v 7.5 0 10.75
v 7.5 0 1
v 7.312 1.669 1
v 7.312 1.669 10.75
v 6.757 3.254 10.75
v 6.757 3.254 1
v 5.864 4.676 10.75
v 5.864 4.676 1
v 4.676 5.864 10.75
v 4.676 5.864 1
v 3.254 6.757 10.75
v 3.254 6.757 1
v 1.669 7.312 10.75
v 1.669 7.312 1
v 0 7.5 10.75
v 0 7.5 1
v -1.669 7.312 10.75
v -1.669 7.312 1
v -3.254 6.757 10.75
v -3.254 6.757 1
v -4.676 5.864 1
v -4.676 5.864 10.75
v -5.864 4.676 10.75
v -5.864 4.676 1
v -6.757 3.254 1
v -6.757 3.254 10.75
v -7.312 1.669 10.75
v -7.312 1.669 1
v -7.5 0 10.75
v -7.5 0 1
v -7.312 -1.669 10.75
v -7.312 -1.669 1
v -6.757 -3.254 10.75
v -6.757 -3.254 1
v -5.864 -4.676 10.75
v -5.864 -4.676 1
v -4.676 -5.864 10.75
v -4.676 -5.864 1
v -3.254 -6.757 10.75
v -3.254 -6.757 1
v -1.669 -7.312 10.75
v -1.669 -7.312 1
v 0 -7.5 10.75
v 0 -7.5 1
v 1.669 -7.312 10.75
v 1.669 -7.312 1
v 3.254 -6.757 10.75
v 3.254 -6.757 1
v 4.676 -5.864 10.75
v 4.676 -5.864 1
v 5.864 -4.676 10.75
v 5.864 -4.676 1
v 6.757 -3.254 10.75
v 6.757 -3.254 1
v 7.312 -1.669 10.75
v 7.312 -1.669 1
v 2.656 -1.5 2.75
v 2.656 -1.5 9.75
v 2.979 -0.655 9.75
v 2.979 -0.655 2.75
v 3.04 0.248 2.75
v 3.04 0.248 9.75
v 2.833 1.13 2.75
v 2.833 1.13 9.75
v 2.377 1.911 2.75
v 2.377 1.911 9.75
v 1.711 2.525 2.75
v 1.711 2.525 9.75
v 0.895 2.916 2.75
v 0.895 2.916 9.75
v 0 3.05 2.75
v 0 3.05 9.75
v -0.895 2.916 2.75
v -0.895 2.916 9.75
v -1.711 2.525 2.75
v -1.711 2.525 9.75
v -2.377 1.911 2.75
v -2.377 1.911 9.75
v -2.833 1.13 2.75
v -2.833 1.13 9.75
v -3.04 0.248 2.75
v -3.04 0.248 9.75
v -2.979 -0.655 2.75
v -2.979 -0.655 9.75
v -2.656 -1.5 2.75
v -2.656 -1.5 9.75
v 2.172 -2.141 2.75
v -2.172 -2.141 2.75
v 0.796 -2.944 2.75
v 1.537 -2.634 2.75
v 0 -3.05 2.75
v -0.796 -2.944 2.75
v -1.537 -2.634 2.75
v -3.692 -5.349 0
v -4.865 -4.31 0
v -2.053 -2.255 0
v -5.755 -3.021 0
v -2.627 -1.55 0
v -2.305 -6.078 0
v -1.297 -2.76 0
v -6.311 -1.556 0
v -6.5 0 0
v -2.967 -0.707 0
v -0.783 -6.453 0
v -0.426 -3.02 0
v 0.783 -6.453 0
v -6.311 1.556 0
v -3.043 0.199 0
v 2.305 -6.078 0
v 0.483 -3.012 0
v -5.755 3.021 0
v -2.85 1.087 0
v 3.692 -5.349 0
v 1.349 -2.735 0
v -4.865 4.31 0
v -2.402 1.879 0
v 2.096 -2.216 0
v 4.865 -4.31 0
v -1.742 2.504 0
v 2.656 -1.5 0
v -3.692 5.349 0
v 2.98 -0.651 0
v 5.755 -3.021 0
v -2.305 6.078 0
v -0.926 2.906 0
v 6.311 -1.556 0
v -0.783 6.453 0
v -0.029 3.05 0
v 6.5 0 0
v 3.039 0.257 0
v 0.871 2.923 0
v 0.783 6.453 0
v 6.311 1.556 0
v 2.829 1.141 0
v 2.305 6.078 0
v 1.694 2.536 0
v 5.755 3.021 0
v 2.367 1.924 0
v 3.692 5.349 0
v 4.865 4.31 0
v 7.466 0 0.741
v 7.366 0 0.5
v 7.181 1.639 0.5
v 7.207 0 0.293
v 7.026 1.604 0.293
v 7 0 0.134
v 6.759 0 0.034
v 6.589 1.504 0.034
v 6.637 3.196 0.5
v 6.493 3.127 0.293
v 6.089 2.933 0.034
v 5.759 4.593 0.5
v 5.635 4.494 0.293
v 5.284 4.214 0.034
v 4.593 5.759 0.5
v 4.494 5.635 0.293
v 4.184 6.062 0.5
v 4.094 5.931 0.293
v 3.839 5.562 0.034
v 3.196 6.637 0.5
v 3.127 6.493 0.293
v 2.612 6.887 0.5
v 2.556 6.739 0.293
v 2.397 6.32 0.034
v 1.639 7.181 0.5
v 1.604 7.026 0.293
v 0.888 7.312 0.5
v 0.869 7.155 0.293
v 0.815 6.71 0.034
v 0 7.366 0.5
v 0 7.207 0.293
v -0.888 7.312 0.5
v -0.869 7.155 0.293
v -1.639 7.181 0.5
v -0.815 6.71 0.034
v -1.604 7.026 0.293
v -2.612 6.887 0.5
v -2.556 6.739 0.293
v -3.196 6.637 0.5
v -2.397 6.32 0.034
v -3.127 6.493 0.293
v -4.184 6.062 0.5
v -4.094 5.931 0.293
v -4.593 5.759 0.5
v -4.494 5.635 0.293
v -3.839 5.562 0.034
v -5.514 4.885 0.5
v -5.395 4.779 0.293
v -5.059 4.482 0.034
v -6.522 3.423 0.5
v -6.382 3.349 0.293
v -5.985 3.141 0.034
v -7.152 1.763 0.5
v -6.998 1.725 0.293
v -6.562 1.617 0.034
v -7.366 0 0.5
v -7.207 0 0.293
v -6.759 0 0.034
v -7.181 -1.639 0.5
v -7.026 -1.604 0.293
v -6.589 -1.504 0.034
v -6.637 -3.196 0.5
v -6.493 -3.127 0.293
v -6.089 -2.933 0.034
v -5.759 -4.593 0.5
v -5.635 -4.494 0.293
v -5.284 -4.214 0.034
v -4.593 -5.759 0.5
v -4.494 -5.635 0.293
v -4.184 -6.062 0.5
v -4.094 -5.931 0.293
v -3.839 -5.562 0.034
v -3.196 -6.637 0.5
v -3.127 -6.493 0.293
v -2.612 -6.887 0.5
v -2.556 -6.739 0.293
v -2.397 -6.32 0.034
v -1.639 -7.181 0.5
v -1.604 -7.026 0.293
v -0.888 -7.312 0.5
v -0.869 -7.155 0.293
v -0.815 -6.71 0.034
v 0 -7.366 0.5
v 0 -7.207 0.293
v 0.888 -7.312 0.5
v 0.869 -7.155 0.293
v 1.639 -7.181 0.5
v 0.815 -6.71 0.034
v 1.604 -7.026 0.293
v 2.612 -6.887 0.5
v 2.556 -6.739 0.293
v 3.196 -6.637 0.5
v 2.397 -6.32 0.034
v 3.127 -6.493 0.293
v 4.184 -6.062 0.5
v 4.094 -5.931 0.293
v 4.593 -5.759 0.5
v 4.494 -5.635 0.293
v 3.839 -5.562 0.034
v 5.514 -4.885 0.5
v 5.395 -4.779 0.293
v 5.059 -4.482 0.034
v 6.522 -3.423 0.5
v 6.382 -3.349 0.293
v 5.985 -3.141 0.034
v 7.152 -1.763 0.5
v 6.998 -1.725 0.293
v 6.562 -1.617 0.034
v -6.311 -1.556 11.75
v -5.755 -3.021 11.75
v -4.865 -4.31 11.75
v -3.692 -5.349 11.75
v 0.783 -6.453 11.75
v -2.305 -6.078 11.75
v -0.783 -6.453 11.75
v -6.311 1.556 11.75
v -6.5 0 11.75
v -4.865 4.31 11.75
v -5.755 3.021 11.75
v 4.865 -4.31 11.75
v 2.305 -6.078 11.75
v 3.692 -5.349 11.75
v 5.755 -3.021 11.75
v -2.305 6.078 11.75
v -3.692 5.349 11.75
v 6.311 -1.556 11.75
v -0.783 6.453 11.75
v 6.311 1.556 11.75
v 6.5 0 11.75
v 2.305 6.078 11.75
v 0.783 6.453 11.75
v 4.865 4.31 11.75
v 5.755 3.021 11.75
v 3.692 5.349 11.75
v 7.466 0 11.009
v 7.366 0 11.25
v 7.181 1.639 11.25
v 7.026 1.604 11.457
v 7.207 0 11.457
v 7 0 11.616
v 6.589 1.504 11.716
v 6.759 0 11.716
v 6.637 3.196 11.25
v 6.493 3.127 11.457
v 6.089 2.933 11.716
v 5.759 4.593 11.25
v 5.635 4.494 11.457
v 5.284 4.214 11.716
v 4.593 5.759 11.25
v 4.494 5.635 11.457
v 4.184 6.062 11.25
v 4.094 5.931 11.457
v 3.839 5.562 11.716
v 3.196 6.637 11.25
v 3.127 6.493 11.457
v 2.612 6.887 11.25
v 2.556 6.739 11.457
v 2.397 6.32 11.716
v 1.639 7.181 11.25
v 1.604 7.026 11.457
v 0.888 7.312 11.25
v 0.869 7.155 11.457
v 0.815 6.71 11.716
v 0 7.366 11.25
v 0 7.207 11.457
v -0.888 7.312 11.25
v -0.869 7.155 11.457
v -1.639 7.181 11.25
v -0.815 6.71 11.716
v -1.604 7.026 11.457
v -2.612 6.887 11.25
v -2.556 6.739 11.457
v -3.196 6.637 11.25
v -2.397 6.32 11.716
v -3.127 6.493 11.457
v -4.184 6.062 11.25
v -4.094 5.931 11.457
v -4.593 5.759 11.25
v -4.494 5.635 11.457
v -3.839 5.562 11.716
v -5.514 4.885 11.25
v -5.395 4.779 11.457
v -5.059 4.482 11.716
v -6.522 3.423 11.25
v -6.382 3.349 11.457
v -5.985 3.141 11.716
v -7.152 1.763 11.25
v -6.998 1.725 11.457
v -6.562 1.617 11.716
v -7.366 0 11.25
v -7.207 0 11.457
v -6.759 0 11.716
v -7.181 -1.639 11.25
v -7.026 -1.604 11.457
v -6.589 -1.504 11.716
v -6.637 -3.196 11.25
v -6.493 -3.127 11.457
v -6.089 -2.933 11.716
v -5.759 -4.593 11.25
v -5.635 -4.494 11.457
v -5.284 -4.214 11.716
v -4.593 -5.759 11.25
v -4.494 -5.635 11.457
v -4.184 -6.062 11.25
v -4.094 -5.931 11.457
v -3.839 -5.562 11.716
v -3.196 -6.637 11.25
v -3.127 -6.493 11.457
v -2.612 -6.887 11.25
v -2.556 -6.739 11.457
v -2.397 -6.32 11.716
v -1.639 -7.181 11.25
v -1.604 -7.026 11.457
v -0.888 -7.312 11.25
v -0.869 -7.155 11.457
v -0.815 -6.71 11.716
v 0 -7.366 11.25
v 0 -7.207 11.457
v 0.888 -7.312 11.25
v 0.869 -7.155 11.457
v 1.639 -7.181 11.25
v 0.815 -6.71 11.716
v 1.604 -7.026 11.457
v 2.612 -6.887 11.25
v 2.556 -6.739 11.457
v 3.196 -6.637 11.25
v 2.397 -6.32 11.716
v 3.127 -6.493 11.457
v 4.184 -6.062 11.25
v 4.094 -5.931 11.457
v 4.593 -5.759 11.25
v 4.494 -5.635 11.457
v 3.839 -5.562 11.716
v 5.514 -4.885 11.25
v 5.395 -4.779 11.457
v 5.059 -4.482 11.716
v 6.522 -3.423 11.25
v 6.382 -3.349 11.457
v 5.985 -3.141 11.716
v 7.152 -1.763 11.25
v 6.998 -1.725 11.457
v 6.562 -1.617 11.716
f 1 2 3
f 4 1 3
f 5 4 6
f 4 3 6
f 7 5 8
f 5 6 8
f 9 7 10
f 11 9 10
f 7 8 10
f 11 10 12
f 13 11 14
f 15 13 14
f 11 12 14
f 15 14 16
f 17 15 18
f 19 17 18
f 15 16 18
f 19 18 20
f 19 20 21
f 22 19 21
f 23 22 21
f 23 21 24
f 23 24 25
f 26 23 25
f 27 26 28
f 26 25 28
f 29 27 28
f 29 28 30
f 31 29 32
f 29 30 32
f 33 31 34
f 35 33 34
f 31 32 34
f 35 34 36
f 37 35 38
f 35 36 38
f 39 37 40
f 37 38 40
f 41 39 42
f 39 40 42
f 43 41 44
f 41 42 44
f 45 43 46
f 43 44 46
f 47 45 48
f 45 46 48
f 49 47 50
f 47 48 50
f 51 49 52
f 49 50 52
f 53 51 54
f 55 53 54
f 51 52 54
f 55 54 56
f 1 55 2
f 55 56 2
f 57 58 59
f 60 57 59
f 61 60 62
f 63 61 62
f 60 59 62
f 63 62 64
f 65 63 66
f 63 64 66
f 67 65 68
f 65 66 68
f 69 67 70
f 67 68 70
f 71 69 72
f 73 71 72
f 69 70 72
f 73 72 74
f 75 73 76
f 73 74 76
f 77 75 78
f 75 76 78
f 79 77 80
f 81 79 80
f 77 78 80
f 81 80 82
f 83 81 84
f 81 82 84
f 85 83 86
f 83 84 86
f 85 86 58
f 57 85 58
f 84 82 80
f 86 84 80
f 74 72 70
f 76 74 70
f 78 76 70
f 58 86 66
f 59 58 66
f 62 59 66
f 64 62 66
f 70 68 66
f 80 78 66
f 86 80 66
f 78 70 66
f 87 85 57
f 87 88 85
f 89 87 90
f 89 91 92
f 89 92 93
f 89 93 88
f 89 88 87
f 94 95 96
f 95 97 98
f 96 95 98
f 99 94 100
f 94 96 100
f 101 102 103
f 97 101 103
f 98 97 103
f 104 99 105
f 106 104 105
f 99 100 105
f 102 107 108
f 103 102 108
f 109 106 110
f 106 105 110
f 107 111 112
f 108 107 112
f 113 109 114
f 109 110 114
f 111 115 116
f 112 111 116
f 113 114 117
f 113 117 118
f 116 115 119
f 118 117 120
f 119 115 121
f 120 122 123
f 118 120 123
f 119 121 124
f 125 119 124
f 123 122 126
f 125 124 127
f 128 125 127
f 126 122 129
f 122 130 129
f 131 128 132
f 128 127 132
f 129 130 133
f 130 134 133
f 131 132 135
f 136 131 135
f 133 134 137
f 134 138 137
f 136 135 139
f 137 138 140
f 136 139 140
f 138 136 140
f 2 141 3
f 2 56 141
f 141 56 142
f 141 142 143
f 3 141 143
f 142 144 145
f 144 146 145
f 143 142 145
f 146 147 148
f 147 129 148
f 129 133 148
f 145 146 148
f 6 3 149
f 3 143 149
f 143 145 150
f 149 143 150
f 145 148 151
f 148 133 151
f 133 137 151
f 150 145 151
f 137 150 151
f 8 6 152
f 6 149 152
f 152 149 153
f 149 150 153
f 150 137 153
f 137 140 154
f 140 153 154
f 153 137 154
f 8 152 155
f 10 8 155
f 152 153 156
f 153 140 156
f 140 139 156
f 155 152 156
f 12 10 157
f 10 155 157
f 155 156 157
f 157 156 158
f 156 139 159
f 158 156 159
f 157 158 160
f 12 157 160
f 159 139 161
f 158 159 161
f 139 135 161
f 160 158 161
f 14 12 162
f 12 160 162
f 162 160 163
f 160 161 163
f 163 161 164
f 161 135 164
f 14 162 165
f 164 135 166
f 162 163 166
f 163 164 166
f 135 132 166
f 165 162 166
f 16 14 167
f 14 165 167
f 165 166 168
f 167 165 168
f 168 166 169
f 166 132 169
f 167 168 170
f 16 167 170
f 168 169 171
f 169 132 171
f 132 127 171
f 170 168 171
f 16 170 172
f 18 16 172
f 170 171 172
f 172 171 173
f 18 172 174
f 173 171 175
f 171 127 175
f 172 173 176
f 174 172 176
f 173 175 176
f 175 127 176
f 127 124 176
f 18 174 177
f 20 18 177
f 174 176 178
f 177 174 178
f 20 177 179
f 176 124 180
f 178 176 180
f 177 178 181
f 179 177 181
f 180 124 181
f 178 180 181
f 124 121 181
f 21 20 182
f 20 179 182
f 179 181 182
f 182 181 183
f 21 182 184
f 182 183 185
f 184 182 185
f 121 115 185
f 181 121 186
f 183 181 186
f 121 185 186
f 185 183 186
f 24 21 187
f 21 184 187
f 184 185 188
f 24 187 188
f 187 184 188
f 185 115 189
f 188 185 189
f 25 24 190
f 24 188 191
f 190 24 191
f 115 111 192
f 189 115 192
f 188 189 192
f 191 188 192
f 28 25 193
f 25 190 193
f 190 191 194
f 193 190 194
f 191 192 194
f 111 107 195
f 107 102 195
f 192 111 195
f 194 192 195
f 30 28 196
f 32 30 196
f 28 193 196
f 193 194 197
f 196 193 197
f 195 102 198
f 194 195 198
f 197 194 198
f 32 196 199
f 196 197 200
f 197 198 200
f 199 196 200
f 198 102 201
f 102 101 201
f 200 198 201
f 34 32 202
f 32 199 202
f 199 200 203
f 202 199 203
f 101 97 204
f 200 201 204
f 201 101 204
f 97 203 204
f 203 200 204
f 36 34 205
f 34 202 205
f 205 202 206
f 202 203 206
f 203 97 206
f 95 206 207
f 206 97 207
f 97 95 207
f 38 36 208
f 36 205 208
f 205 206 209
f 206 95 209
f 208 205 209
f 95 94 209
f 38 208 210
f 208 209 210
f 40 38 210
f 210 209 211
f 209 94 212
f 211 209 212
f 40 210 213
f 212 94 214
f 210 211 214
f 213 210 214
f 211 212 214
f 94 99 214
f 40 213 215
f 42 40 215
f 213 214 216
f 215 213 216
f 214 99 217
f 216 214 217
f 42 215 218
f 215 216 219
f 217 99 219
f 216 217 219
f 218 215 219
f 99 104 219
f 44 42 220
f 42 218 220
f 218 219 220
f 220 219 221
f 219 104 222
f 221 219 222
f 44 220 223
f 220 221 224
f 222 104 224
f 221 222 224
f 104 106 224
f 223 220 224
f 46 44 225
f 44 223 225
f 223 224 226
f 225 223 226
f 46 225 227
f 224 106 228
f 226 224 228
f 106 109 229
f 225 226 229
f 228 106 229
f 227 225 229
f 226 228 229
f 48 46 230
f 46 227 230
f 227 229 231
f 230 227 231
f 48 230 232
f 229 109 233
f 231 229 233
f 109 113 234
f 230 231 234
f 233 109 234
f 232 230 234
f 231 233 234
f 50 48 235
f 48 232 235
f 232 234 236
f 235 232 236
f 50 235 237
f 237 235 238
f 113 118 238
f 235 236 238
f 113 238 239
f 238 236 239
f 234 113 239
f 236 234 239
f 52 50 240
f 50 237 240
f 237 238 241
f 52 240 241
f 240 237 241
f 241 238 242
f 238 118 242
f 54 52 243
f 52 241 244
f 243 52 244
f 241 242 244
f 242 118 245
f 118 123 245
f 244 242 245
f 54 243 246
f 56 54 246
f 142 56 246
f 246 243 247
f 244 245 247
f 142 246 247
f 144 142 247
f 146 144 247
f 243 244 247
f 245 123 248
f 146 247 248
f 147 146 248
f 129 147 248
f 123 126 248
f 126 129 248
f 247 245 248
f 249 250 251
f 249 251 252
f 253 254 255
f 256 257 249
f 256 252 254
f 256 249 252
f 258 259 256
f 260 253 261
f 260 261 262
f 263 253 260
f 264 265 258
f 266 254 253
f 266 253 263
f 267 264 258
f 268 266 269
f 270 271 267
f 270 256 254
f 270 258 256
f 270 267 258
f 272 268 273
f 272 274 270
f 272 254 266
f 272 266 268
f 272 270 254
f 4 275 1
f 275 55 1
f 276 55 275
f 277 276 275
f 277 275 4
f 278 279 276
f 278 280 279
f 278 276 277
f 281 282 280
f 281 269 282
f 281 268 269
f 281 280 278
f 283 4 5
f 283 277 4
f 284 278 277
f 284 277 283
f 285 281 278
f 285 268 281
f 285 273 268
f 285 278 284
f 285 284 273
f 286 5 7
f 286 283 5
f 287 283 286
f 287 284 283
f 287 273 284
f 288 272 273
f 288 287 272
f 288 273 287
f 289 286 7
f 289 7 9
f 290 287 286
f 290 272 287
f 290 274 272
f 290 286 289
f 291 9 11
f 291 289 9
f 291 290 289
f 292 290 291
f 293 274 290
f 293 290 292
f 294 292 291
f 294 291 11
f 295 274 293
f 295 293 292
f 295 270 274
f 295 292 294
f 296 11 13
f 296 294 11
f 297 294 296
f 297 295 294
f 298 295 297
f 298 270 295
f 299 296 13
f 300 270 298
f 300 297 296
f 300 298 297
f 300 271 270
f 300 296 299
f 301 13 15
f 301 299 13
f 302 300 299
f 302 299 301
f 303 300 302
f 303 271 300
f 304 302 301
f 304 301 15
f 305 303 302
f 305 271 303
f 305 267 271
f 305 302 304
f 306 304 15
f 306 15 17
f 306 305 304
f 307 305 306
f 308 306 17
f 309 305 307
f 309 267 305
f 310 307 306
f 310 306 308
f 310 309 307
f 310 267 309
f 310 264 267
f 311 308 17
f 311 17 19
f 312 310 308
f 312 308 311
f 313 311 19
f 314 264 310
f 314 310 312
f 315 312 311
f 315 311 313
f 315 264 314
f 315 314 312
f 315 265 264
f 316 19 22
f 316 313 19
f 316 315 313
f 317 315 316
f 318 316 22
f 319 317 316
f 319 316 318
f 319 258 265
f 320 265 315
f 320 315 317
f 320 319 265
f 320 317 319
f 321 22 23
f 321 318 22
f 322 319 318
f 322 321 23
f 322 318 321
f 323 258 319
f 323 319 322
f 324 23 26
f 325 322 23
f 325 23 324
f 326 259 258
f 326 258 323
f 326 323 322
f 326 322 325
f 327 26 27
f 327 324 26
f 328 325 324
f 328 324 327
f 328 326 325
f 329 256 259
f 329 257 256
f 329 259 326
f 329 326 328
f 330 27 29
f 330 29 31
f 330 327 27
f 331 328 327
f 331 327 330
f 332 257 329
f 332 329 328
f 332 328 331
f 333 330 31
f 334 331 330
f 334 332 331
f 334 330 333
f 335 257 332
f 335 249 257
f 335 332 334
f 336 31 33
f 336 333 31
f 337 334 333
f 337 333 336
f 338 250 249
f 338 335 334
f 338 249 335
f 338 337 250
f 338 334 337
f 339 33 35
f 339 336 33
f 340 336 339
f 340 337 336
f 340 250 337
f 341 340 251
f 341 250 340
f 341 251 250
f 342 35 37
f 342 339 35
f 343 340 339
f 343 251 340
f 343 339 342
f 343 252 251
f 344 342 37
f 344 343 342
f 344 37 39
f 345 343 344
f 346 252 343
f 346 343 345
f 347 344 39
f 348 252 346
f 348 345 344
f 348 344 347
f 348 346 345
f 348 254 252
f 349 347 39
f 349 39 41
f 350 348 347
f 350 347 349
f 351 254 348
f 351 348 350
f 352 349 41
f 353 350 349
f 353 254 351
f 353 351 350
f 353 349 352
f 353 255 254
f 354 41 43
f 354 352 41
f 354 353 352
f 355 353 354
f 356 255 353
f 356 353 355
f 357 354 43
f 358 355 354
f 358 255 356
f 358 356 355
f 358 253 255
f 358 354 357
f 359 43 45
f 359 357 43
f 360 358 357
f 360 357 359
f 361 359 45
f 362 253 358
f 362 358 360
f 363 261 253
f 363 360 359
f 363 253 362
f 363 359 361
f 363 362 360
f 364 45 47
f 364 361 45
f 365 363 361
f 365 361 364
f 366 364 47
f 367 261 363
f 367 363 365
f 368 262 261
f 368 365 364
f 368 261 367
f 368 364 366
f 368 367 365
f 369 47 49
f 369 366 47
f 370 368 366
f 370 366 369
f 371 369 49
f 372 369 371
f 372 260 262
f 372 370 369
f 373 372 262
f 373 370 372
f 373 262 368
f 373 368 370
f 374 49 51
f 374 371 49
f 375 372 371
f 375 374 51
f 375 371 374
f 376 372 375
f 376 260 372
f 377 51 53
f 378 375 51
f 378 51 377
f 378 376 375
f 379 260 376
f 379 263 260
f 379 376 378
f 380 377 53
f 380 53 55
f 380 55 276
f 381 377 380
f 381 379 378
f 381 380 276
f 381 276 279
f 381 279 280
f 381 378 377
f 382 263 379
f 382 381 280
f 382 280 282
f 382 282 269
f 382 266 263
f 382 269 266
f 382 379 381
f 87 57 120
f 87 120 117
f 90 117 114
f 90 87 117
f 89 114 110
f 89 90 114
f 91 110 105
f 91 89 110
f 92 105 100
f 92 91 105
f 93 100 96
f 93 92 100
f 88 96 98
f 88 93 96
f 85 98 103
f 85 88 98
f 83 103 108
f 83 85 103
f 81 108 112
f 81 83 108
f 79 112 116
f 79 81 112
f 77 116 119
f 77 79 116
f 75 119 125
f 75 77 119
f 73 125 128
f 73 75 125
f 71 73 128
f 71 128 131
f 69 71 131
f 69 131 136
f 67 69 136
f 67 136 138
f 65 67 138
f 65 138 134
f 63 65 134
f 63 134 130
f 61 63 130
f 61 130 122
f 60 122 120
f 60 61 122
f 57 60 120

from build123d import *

# Parameters (mm, degrees)
IZIM1_R                     = 7.5
Y_KSEKLIK_EKSTR_ZYON1_DEPTH = 11.75
KES_EKSTR_ZYON1_DEPTH       = 7
RADYUS1_R                   = 1
KES_EKSTR_ZYON2_START       = -2.75
IZIM3_R                     = 3.05
KES_EKSTR_ZYON2_DEPTH       = 2.75


with BuildPart() as part:
    # Çizim1 → Yükseklik-Ekstrüzyon1 (new body)
    with BuildSketch(Plane.XY):
        Circle(IZIM1_R)
    extrude(amount=Y_KSEKLIK_EKSTR_ZYON1_DEPTH)

    # Çizim2 → Kes-Ekstrüzyon1 (cut)
    with BuildSketch(Plane.XY.offset(9.75)):
        with BuildLine():
            Line((-2.655654345, -1.5), (2.655654345, -1.5))
            ThreePointArc((2.655654345, -1.5), (0, 3.05), (-2.655654345, -1.5))
        make_face()
    extrude(amount=-KES_EKSTR_ZYON1_DEPTH, mode=Mode.SUBTRACT)

    # Radyus1
    radyus1_edges = [part.edges().sort_by_distance(p)[0] for p in [
        (-7.5, 0, 0),
        (-7.5, 0, 11.75),
    ]]
    fillet(radyus1_edges, radius=RADYUS1_R)

    # Çizim3 → Kes-Ekstrüzyon2 (cut)
    with BuildSketch(Plane(origin=(0, 0, 0), x_dir=(-1, 0, 0), z_dir=(0, 0, -1)).offset(KES_EKSTR_ZYON2_START)):
        with Locations(Location((0, 0, 0), (0, 0, 209.459174912))):
            Circle(IZIM3_R)
    extrude(amount=KES_EKSTR_ZYON2_DEPTH, mode=Mode.SUBTRACT)


solid = part.part
